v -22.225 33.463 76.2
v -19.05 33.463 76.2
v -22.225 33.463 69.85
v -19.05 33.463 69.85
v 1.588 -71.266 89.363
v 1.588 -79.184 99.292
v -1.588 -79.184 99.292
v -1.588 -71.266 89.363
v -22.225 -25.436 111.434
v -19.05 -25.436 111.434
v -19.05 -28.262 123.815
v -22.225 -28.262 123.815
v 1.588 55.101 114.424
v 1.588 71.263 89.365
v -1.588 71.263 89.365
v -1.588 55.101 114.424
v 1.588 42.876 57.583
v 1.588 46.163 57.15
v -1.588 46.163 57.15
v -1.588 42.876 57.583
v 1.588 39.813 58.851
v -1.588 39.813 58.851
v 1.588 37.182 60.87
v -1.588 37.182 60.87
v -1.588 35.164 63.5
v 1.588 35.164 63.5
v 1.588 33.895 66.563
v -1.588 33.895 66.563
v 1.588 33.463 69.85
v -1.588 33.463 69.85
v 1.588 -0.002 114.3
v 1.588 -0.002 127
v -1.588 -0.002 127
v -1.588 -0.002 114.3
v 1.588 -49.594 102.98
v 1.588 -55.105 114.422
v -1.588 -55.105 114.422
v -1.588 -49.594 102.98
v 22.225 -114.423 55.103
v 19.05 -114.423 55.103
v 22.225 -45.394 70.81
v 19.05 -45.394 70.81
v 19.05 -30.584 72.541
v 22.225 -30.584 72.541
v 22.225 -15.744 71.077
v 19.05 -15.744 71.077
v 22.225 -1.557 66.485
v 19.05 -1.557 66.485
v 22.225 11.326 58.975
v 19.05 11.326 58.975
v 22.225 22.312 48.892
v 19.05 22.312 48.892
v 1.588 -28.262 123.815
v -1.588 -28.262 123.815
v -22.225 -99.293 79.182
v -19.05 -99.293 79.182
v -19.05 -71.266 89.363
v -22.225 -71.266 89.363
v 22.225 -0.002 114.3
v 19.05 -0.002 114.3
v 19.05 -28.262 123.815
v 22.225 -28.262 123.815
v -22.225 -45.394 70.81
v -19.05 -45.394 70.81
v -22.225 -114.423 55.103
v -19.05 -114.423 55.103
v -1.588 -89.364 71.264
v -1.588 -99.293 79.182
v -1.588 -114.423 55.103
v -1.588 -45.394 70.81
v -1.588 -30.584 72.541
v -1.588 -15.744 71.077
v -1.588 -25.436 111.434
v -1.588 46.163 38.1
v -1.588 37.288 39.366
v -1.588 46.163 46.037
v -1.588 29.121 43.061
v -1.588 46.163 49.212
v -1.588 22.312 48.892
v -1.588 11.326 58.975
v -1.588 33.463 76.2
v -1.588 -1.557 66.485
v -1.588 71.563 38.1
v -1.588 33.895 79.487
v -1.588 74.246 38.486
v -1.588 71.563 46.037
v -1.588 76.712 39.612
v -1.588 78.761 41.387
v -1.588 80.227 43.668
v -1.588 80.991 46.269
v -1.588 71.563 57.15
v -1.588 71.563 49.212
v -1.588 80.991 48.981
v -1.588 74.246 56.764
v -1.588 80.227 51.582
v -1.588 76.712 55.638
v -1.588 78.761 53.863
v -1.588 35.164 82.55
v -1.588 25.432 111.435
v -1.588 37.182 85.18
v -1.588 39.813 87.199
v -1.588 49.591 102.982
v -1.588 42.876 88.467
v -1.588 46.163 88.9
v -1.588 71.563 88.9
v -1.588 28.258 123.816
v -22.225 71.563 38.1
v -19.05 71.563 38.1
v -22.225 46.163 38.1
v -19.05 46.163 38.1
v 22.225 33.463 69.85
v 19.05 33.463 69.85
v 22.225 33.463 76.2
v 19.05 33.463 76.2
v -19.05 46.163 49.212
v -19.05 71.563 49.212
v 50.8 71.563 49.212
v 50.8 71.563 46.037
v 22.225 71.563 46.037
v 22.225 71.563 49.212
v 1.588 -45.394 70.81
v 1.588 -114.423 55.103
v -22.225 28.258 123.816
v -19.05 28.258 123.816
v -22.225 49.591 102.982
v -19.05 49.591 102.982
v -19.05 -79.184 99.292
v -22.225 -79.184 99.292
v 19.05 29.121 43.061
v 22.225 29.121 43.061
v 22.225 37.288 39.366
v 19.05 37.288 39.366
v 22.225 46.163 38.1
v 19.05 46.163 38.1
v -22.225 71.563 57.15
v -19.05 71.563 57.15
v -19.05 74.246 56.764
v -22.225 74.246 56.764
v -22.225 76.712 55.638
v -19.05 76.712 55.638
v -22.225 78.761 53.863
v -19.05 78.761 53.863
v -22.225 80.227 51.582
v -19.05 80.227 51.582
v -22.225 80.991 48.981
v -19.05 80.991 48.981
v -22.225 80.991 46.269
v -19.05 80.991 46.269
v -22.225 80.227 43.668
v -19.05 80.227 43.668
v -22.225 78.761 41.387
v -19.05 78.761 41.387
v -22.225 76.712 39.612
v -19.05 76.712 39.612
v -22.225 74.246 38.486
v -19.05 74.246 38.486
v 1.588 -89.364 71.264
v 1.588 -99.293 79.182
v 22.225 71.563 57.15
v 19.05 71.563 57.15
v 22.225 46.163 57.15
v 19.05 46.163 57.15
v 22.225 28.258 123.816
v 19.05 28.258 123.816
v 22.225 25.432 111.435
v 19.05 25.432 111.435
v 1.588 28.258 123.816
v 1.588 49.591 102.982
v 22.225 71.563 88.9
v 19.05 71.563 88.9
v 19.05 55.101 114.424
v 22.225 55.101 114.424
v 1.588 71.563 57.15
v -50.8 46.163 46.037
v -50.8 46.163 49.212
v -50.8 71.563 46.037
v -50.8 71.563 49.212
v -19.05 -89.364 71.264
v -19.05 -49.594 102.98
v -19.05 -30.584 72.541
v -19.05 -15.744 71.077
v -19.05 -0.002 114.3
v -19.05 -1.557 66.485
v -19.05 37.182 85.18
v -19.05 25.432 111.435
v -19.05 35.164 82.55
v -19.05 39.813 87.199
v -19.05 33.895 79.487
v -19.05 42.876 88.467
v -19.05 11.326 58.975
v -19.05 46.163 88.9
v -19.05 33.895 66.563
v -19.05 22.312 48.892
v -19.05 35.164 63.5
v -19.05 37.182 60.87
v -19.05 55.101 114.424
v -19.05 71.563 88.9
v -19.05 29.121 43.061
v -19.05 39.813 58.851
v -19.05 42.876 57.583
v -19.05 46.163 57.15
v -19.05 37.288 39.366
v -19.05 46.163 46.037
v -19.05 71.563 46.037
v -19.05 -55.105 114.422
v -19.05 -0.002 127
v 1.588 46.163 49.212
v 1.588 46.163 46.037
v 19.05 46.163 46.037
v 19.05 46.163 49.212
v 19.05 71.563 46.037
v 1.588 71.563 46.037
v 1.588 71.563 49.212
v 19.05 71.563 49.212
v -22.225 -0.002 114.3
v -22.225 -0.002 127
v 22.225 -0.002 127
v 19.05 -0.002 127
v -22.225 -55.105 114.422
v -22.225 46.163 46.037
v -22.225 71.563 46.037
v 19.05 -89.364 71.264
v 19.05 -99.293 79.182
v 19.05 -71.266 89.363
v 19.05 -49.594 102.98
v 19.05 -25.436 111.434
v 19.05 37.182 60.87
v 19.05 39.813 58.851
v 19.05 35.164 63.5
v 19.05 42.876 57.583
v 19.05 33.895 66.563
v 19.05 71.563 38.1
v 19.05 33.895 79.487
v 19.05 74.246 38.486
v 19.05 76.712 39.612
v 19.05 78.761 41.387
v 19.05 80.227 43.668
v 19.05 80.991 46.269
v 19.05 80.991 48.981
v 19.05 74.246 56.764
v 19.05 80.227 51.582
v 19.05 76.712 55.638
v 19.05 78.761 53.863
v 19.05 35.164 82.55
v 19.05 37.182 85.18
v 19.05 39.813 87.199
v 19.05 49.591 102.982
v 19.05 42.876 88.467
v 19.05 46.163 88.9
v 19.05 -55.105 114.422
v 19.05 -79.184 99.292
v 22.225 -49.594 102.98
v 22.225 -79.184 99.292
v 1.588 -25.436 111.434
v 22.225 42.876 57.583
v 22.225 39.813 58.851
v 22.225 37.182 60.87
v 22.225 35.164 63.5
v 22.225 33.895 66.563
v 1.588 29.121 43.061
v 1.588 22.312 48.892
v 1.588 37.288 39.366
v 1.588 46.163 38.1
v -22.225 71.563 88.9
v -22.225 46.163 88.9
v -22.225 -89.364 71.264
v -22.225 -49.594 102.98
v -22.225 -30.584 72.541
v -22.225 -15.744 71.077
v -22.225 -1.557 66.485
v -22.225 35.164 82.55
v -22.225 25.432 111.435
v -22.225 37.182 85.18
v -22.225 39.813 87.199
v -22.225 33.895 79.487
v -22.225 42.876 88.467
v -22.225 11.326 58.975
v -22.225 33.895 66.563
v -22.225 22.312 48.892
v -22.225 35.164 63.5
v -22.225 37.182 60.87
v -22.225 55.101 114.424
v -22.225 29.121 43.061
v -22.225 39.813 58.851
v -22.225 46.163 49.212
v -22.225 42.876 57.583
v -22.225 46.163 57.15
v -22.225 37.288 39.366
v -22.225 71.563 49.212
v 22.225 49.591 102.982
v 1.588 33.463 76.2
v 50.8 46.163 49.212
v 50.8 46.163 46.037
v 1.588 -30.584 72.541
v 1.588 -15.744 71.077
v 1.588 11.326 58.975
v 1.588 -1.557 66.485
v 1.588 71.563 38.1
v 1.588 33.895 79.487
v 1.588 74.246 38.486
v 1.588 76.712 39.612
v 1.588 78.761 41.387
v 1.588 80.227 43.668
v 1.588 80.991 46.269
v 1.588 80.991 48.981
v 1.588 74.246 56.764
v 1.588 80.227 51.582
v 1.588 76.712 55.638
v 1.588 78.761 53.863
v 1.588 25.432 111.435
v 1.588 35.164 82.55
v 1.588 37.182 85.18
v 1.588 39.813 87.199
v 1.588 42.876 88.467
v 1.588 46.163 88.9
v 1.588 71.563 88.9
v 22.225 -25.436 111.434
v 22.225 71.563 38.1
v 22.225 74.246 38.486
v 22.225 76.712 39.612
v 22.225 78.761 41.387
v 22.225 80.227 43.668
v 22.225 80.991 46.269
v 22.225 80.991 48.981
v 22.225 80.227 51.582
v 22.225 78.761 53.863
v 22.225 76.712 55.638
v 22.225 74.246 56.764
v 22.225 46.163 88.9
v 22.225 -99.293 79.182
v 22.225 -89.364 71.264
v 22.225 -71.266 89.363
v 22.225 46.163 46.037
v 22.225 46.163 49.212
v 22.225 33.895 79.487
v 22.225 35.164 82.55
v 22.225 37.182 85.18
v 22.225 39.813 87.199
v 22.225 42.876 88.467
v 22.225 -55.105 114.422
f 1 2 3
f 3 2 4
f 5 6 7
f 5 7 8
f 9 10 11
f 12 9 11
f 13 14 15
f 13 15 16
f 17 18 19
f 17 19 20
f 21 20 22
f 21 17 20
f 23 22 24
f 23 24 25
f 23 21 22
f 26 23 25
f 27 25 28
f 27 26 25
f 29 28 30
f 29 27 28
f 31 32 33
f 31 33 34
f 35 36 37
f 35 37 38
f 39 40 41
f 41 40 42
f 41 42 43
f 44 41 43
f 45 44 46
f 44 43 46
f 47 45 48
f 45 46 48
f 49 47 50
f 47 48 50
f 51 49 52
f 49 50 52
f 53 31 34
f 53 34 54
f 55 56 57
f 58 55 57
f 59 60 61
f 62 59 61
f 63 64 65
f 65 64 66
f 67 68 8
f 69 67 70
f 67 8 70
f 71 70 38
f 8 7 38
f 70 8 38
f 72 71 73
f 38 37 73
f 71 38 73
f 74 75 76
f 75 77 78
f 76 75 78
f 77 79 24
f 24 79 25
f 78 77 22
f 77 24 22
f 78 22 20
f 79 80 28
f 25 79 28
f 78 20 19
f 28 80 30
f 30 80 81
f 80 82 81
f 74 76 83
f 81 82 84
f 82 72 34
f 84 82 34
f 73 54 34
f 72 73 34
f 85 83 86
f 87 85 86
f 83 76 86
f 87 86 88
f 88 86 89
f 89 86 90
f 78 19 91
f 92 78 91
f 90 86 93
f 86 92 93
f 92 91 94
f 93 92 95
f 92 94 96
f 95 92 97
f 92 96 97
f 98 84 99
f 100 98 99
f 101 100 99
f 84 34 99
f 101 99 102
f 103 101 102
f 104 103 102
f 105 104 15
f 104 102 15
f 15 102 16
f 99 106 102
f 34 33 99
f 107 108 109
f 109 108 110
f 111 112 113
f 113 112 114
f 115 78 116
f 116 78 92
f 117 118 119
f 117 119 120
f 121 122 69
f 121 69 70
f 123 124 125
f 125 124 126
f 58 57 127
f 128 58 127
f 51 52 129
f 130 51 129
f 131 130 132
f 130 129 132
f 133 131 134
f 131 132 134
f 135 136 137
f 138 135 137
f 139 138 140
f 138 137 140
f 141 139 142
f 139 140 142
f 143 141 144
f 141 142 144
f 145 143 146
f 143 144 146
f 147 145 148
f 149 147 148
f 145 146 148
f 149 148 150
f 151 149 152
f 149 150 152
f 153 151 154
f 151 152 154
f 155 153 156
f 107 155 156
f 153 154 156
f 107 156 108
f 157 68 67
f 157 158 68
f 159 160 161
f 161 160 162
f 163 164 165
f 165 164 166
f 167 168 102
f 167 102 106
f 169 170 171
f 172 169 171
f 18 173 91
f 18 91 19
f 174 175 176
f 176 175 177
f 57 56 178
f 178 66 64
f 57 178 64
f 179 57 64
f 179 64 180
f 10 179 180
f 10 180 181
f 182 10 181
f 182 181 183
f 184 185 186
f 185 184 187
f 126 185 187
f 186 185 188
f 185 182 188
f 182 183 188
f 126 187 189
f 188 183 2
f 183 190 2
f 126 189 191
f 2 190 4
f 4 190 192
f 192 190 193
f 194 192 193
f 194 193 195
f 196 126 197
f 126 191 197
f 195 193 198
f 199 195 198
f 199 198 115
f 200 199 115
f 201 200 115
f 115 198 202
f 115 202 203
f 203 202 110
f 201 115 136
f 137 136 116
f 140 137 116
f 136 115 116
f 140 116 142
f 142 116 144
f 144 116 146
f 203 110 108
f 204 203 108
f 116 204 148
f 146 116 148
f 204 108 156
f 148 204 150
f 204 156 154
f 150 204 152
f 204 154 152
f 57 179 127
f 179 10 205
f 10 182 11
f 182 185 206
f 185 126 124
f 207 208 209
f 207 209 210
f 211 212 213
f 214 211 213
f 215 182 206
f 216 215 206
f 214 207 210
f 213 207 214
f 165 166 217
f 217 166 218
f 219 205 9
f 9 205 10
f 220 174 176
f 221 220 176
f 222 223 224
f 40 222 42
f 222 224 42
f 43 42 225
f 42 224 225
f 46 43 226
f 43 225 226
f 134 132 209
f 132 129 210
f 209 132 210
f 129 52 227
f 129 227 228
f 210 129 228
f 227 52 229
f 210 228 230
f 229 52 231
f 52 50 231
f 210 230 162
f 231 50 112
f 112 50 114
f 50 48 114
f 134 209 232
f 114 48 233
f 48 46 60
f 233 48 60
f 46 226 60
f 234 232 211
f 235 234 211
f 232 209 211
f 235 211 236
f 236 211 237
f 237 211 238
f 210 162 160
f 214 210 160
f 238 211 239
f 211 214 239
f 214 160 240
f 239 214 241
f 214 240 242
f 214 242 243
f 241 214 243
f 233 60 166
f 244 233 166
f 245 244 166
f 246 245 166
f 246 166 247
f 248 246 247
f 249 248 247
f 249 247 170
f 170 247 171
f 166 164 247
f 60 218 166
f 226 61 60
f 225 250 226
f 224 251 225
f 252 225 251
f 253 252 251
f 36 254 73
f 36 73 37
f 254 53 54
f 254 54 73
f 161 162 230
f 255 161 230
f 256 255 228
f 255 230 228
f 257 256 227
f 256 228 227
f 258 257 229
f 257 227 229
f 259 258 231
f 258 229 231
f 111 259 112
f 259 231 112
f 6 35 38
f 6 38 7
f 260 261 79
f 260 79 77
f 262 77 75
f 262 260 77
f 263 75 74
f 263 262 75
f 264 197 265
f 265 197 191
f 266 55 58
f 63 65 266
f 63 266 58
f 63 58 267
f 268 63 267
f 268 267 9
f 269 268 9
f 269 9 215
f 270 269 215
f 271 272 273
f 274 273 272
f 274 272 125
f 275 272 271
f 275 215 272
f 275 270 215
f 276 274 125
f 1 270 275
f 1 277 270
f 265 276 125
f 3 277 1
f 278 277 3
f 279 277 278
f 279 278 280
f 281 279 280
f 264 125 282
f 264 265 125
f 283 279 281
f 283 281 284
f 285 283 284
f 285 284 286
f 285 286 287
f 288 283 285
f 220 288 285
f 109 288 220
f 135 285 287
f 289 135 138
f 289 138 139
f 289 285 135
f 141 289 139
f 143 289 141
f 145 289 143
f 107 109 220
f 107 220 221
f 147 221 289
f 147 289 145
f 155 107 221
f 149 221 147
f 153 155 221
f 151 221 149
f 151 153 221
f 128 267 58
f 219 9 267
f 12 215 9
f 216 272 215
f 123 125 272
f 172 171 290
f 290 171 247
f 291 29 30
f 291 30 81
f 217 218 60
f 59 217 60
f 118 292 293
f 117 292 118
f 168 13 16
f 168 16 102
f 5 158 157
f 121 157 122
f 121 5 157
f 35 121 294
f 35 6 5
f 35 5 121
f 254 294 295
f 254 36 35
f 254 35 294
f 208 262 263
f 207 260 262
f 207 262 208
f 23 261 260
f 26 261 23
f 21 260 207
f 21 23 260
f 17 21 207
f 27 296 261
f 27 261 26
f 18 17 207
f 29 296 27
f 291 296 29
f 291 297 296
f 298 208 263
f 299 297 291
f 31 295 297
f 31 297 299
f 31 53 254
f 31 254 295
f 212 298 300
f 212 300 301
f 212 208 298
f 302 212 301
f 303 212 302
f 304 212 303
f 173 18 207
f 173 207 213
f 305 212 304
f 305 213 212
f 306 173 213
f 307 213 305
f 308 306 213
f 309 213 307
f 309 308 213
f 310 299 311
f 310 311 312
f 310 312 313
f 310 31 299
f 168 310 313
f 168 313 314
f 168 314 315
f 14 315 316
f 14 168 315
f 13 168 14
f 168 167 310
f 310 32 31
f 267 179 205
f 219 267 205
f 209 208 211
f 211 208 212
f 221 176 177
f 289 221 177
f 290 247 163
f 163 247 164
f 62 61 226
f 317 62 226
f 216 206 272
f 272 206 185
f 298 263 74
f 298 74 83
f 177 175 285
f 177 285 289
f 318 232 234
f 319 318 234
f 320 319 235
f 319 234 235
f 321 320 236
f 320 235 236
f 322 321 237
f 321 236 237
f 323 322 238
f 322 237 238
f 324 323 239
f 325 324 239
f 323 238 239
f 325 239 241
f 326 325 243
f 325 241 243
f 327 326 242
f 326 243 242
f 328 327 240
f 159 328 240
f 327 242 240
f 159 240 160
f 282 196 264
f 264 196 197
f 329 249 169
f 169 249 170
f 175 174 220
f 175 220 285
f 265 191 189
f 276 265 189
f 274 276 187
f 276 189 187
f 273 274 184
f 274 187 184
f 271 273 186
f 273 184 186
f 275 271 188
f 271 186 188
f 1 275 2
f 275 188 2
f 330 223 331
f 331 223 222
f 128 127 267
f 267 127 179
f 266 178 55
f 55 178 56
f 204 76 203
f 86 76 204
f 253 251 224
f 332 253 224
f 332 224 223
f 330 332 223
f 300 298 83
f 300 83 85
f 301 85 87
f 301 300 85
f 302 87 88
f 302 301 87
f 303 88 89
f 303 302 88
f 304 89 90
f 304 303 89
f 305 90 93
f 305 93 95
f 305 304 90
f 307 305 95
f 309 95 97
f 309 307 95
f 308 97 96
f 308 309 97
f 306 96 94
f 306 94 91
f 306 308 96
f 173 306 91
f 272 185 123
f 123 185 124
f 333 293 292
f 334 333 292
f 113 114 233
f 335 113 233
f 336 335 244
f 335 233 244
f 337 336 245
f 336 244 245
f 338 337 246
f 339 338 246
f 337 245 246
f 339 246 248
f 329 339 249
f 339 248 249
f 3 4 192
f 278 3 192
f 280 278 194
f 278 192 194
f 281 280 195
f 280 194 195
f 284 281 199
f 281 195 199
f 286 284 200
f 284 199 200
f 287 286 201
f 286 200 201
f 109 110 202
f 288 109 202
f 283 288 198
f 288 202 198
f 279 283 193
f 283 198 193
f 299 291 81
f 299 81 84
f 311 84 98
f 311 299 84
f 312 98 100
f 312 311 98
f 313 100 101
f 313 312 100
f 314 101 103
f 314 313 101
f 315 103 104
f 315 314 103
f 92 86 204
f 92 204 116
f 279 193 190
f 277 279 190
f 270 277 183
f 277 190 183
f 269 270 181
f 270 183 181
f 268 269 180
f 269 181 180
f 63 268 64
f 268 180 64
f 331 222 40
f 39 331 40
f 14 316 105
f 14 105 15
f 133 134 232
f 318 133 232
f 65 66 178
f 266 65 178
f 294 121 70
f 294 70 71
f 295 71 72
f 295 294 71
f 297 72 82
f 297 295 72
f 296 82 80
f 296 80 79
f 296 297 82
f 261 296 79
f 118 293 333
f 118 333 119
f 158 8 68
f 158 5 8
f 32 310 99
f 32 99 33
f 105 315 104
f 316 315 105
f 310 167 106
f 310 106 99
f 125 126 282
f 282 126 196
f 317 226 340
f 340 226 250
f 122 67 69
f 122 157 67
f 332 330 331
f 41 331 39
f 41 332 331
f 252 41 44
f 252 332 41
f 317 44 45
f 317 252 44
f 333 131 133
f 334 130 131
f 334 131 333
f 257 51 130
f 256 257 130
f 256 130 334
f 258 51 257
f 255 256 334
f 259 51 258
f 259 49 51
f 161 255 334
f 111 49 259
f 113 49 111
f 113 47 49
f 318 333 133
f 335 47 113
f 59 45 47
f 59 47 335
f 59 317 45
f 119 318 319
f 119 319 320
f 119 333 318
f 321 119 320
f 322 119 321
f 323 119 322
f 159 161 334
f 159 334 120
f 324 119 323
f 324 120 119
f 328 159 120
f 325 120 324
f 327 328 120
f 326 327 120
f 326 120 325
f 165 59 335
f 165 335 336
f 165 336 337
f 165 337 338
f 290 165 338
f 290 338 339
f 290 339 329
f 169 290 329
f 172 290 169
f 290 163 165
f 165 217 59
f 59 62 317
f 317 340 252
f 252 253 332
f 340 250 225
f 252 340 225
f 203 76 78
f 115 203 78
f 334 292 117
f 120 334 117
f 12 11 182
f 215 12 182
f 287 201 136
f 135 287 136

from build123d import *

# Parameters (mm, degrees)
F1_DEPTH      = 1.5875
F1_DEPTH_BACK = 1.5875
F2_START      = 17.4625
F2_DEPTH      = 3.175
F3_START      = 17.4625
F3_DEPTH      = 3.175
F4_W          = 25.4
F4_H          = 3.175
F5_DEPTH      = 50.8
F5_DEPTH_BACK = 50.8


with BuildPart() as f1:
    # F0 (on Right) → F1 (new body, two sides)
    with BuildSketch(Plane.YZ) as f1_sk:
        with BuildLine():
            Line((-89.3638715037, 71.2642159143), (-114.423321003, 55.102664279))
            Line((-114.423321003, 55.102664279), (-45.394477118, 70.8098596439))
            ThreePointArc((-45.394477118, 70.8098596439), (-8.5270592577, 69.1620720095), (22.3122345378, 48.8923985547))
            ThreePointArc((22.3122345378, 48.8923985547), (33.0733487312, 40.9236595167), (46.1626316513, 38.0999999807))
            Line((46.1626316513, 38.0999999807), (71.5626337911, 38.0999999807))
            ThreePointArc((71.5626337911, 38.0999999807), (81.0876337911, 47.6249999807), (71.5626337911, 57.1499999807))
            Line((71.5626337911, 57.1499999807), (46.1626316513, 57.1499999807))
            ThreePointArc((46.1626316513, 57.1499999807), (37.1823755302, 60.8697438596), (33.4626316513, 69.8499999807))
            Line((33.4626316513, 69.8499999807), (33.4626316513, 76.1999999807))
            ThreePointArc((33.4626316513, 76.1999999807), (37.1823762868, 85.1802568583), (46.1626337911, 88.8999999807))
            Line((46.1626337911, 88.8999999807), (71.5626337911, 88.8999999807))
            Line((71.5626337911, 88.8999999807), (71.2626562096, 89.3651152853))
            Line((71.2626562096, 89.3651152853), (55.1006672069, 114.4242827085))
            Line((55.1006672069, 114.4242827085), (49.5906004862, 102.9818544376))
            Line((49.5906004862, 102.9818544376), (28.2576888992, 123.8164085171))
            Line((28.2576888992, 123.8164085171), (25.4319200093, 111.4347676654))
            Line((25.4319200093, 111.4347676654), (-0.0022165681, 126.9999999807))
            Line((-0.0022165681, 126.9999999807), (-0.0019949113, 114.2999999826))
            Line((-0.0019949113, 114.2999999826), (-28.26201089, 123.8154220623))
            Line((-28.26201089, 123.8154220623), (-25.435809801, 111.433879856))
            Line((-25.435809801, 111.433879856), (-55.1046613343, 114.4223592627))
            Line((-55.1046613343, 114.4223592627), (-49.5941952009, 102.9801233364))
            Line((-49.5941952009, 102.9801233364), (-79.184195108, 99.2918085499))
            Line((-79.184195108, 99.2918085499), (-71.2657755972, 89.3626276949))
            Line((-71.2657755972, 89.3626276949), (-99.2931905596, 79.1824621269))
            Line((-99.2931905596, 79.1824621269), (-89.3638715037, 71.2642159143))
        make_face()
    extrude(amount=F1_DEPTH)
    extrude(f1_sk.sketch, amount=-F1_DEPTH_BACK)



with BuildPart() as f2:
    # F1_face (on face) → F2 (new body)
    with BuildSketch(Plane(origin=(1.5875, -4.3675464113, 83.8957908955), x_dir=(0, 1, 0), z_dir=(1, 0, 0)).offset(F2_START)):
        with BuildLine():
            Line((-94.9256441483, -4.7133287685), (-84.9963250924, -12.6315749812))
            Line((-84.9963250924, -12.6315749812), (-110.0557745917, -28.7931266165))
            Line((-110.0557745917, -28.7931266165), (-41.0269307067, -13.0859312515))
            ThreePointArc((-41.0269307067, -13.0859312515), (-4.1595128464, -14.733718886), (26.6797809491, -35.0033923408))
            ThreePointArc((26.6797809491, -35.0033923408), (37.4408951425, -42.9721313788), (50.5301780626, -45.7957909148))
            Line((50.5301780626, -45.7957909148), (75.9301802024, -45.7957909148))
            ThreePointArc((75.9301802024, -45.7957909148), (85.4551802024, -36.2707909148), (75.9301802024, -26.7457909148))
            Line((75.9301802024, -26.7457909148), (50.5301780626, -26.7457909148))
            ThreePointArc((50.5301780626, -26.7457909148), (41.5499219415, -23.0260470359), (37.8301780626, -14.0457909148))
            Line((37.8301780626, -14.0457909148), (37.8301780626, -7.6957909148))
            ThreePointArc((37.8301780626, -7.6957909148), (41.5499226981, 1.2844659628), (50.5301802024, 5.0042090852))
            Line((50.5301802024, 5.0042090852), (75.9301802024, 5.0042090852))
            Line((75.9301802024, 5.0042090852), (59.4682136182, 30.528491813))
            Line((59.4682136182, 30.528491813), (53.9581468975, 19.0860635422))
            Line((53.9581468975, 19.0860635422), (32.6252353105, 39.9206176217))
            Line((32.6252353105, 39.9206176217), (29.7994664206, 27.5389767699))
            Line((29.7994664206, 27.5389767699), (4.3653298432, 43.1042090852))
            Line((4.3653298432, 43.1042090852), (4.3655515, 30.4042090871))
            Line((4.3655515, 30.4042090871), (-23.8944644787, 39.9196311668))
            Line((-23.8944644787, 39.9196311668), (-21.0682633897, 27.5380889606))
            Line((-21.0682633897, 27.5380889606), (-50.737114923, 30.5265683672))
            Line((-50.737114923, 30.5265683672), (-45.2266487895, 19.0843324409))
            Line((-45.2266487895, 19.0843324409), (-74.8166486967, 15.3960176544))
            Line((-74.8166486967, 15.3960176544), (-66.8982291859, 5.4668367994))
            Line((-66.8982291859, 5.4668367994), (-94.9256441483, -4.7133287685))
        make_face()
    extrude(amount=F2_DEPTH)


with BuildPart() as f3:
    # F1_face1 (on face) → F3 (new body)
    with BuildSketch(Plane(origin=(-1.5875, -4.3675464113, 83.8957908955), x_dir=(0, 1, 0), z_dir=(-1, 0, 0)).offset(F3_START)):
        with BuildLine():
            Line((-84.9963250924, 12.6315749812), (-94.9256441483, 4.7133287685))
            Line((-94.9256441483, 4.7133287685), (-66.8982291859, -5.4668367994))
            Line((-66.8982291859, -5.4668367994), (-74.8166486967, -15.3960176544))
            Line((-74.8166486967, -15.3960176544), (-45.2266487895, -19.0843324409))
            Line((-45.2266487895, -19.0843324409), (-50.737114923, -30.5265683672))
            Line((-50.737114923, -30.5265683672), (-21.0682633897, -27.5380889606))
            Line((-21.0682633897, -27.5380889606), (-23.8944644787, -39.9196311668))
            Line((-23.8944644787, -39.9196311668), (4.3655515, -30.4042090871))
            Line((4.3655515, -30.4042090871), (4.3653298432, -43.1042090852))
            Line((4.3653298432, -43.1042090852), (29.7994664206, -27.5389767699))
            Line((29.7994664206, -27.5389767699), (32.6252353105, -39.9206176217))
            Line((32.6252353105, -39.9206176217), (53.9581468975, -19.0860635422))
            Line((53.9581468975, -19.0860635422), (59.4682136182, -30.528491813))
            Line((59.4682136182, -30.528491813), (75.9301802024, -5.0042090852))
            Line((75.9301802024, -5.0042090852), (50.5301802024, -5.0042090852))
            ThreePointArc((50.5301802024, -5.0042090852), (41.5499226981, -1.2844659628), (37.8301780626, 7.6957909148))
            Line((37.8301780626, 7.6957909148), (37.8301780626, 14.0457909148))
            ThreePointArc((37.8301780626, 14.0457909148), (41.5499219415, 23.0260470359), (50.5301780626, 26.7457909148))
            Line((50.5301780626, 26.7457909148), (75.9301802024, 26.7457909148))
            ThreePointArc((75.9301802024, 26.7457909148), (85.4551802024, 36.2707909148), (75.9301802024, 45.7957909148))
            Line((75.9301802024, 45.7957909148), (50.5301780626, 45.7957909148))
            ThreePointArc((50.5301780626, 45.7957909148), (37.4408951425, 42.9721313788), (26.6797809491, 35.0033923408))
            ThreePointArc((26.6797809491, 35.0033923408), (-4.1595128464, 14.733718886), (-41.0269307067, 13.0859312515))
            Line((-41.0269307067, 13.0859312515), (-110.0557745917, 28.7931266165))
            Line((-110.0557745917, 28.7931266165), (-84.9963250924, 12.6315749812))
        make_face()
    extrude(amount=F3_DEPTH)


with BuildPart() as f1_1:
    add(f1.part)

    add(f2.part)  # F5 merges F2

    add(f3.part)  # F5 merges F3
    # F4 (on face) → F5 (join, two sides)
    with BuildSketch(Plane.YZ) as f5_sk:
        with Locations((58.8626337911, 47.6249999807)):
            Rectangle(F4_W, F4_H)
    extrude(amount=F5_DEPTH)
    extrude(f5_sk.sketch, amount=-F5_DEPTH_BACK)


solid = f1_1.part
